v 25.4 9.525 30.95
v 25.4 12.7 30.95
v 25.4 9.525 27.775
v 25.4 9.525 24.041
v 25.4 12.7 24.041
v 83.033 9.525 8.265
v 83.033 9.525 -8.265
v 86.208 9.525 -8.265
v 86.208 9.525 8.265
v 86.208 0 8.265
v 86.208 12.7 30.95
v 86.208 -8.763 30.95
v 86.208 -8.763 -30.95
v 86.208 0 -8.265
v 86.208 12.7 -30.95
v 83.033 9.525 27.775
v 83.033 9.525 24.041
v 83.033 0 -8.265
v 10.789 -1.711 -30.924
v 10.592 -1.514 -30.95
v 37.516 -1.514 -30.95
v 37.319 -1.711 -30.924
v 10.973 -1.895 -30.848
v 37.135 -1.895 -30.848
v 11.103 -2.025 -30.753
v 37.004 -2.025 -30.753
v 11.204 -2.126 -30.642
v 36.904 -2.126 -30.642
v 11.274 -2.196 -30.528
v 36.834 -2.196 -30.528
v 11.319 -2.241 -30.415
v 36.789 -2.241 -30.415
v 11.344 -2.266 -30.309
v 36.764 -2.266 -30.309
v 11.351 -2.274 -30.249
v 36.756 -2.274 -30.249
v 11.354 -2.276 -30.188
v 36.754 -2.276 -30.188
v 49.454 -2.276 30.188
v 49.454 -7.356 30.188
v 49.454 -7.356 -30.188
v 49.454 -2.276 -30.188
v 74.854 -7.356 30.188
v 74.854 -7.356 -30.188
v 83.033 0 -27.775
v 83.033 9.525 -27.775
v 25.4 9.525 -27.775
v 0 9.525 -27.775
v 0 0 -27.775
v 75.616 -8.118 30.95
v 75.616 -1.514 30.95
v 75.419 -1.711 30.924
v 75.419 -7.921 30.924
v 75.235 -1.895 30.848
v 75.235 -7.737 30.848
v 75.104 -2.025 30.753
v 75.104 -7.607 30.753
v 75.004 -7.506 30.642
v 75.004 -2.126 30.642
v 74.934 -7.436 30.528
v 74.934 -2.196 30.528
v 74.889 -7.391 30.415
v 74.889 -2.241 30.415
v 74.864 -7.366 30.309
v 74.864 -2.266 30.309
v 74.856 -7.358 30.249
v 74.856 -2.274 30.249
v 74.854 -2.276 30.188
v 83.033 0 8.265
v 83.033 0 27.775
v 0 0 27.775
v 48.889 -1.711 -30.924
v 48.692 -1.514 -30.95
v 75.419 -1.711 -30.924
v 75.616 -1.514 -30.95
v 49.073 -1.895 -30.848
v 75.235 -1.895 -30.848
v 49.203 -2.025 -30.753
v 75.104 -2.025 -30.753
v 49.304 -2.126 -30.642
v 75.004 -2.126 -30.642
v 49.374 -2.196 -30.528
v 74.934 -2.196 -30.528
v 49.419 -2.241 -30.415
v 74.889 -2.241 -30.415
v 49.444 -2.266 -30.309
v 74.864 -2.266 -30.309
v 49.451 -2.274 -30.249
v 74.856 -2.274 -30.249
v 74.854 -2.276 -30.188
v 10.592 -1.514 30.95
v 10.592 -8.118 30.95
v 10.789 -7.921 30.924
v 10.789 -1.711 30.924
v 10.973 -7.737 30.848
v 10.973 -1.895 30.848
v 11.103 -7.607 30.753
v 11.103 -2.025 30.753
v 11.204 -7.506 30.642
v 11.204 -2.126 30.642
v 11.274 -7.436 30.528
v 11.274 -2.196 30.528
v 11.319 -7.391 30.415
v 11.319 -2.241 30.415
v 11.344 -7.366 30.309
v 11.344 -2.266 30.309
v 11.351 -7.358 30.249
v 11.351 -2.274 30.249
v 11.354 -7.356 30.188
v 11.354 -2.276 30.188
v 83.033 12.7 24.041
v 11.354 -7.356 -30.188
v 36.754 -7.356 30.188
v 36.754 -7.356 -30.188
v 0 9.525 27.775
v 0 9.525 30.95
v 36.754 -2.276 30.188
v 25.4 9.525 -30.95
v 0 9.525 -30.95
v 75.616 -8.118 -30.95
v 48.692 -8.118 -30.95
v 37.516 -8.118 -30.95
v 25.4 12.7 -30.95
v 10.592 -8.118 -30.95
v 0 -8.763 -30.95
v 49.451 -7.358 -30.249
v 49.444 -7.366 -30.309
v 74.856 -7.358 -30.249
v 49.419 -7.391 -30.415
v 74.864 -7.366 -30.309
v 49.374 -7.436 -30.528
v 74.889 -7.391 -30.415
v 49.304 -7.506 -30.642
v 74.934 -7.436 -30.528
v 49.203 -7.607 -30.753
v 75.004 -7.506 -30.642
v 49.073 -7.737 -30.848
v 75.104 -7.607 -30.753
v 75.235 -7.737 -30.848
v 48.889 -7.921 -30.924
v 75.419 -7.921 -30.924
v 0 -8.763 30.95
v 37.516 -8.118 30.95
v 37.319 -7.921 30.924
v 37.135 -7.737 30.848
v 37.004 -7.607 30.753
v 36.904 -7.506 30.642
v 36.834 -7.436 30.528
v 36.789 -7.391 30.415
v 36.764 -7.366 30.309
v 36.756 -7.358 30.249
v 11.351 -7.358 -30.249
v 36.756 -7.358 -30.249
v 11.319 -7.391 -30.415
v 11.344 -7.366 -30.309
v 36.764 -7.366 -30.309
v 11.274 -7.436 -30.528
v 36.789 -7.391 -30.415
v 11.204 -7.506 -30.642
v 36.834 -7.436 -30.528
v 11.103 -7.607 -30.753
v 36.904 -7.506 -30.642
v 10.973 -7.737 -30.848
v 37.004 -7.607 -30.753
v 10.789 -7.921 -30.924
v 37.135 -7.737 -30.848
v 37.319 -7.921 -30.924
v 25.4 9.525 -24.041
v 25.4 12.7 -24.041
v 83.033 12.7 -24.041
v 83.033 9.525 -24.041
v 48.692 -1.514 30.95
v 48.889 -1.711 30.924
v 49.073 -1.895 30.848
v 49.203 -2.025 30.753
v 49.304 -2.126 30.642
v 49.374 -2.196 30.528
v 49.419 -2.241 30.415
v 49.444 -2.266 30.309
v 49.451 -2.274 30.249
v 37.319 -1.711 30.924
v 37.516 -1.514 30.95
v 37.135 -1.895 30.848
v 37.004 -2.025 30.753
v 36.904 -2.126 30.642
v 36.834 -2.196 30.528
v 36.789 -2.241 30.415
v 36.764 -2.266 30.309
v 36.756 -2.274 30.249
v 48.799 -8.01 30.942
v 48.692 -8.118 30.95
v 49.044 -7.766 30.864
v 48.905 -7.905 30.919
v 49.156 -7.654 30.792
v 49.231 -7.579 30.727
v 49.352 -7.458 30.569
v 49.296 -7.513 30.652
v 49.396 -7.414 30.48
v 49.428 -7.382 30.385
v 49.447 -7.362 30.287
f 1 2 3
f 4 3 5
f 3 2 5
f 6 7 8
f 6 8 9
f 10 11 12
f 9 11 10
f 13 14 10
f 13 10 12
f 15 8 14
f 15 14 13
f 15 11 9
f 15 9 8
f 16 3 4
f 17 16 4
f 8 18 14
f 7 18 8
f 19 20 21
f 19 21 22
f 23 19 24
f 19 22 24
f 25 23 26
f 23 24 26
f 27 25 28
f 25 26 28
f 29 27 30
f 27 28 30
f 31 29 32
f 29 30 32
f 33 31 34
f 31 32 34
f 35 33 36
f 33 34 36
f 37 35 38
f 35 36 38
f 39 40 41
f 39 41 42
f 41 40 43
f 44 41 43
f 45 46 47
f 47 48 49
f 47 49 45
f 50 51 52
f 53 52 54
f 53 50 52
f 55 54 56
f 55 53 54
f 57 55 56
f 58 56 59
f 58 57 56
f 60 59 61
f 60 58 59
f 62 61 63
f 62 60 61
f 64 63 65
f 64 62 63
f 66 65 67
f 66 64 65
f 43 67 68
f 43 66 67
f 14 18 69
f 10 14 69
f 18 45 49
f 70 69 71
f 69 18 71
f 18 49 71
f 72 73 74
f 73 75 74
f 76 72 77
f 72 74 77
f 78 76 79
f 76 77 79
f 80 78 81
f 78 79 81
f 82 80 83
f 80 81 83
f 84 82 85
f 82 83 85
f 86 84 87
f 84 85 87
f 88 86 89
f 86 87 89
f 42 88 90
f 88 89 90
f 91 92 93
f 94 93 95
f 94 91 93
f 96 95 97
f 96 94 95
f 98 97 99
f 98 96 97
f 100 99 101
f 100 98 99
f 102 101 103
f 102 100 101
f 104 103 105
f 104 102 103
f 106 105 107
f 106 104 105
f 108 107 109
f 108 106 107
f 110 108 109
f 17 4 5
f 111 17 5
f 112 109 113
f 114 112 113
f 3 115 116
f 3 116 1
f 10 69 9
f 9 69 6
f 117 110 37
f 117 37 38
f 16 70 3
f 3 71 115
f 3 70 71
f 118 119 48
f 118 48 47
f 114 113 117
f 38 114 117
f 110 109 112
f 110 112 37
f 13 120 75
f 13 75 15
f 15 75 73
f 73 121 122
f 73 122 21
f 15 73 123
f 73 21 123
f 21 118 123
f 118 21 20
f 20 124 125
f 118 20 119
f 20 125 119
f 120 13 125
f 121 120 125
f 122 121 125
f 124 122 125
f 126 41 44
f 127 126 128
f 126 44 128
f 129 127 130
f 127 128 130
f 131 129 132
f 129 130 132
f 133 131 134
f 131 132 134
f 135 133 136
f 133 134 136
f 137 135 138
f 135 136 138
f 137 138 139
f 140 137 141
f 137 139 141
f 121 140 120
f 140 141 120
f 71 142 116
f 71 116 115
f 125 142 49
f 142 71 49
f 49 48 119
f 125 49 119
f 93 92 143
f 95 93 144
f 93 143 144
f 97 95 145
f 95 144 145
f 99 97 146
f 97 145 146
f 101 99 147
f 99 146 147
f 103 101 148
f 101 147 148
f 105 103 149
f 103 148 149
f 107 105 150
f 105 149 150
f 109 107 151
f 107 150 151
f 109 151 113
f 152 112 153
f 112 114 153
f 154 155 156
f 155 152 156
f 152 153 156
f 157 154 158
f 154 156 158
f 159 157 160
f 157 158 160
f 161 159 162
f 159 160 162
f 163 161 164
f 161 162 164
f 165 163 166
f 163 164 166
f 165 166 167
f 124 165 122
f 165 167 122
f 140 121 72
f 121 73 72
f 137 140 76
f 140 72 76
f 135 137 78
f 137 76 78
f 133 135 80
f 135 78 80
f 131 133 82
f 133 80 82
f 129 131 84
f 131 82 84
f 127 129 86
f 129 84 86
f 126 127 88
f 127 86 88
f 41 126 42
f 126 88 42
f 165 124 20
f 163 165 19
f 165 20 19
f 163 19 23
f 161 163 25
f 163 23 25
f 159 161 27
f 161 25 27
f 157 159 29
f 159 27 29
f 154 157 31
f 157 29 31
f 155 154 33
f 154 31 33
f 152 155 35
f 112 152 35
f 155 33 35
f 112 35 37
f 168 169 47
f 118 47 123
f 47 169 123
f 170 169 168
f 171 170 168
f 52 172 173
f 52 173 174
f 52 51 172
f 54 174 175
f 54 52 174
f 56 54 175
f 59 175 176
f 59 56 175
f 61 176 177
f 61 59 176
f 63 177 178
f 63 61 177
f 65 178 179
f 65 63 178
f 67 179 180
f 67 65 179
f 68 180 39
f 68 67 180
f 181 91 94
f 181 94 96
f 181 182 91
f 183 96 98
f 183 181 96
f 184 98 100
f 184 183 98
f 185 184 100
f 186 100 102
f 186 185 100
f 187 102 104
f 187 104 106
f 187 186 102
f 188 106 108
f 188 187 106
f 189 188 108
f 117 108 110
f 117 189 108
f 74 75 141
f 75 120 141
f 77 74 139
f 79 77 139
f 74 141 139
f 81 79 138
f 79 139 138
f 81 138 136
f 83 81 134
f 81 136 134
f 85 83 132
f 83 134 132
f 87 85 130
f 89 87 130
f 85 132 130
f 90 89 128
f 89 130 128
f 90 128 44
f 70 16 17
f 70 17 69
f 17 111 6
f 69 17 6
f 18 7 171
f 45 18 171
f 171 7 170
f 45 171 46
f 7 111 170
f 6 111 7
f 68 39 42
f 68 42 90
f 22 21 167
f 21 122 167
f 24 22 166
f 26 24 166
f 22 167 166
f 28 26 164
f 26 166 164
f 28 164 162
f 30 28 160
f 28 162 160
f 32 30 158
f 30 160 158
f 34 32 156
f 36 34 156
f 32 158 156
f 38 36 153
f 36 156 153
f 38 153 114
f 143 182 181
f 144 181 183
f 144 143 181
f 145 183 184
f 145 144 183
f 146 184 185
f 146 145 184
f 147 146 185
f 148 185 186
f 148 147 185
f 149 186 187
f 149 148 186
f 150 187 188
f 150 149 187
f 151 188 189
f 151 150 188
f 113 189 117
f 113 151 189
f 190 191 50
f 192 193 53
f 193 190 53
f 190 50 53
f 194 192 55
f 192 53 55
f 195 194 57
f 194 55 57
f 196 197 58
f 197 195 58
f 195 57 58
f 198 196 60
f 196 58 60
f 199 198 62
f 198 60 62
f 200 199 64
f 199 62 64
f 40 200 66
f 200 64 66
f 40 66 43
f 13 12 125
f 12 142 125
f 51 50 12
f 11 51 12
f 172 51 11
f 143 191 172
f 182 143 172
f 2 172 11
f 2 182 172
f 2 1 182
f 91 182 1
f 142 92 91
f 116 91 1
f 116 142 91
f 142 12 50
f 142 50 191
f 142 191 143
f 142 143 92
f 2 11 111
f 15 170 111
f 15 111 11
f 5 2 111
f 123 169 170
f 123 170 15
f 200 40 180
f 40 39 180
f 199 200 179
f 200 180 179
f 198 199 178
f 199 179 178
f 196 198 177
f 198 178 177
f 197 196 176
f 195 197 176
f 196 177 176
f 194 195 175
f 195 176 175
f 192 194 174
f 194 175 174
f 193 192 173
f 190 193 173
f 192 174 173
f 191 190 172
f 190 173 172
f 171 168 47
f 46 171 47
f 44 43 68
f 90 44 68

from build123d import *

# Parameters (mm, degrees)
BOSS_EXTRUDE1_DEPTH = 83.0326
SKETCH2_W           = 61.8998
SKETCH2_H           = 21.463
BOSS_EXTRUDE2_DEPTH = 3.175
SKETCH3_W           = 25.4
SKETCH3_H           = 5.08
CUT_EXTRUDE1_DEPTH  = 107.886039958
FILLET1_R           = 0.762
FILLET2_R           = 0.762
FILLET3_R           = 0.762
SKETCH5_W           = 16.529901782
SKETCH5_H           = 9.525
CUT_EXTRUDE2_DEPTH  = 90.51870739
SKETCH42_W          = 25.4
SKETCH42_H          = 6.9088
CUT_EXTRUDE3_DEPTH  = 3.175


with BuildPart() as part:
    # Sketch1 → Boss-Extrude1 (new body)
    with BuildSketch(Plane(origin=(0, 0, 0), x_dir=(0, 0, -1), z_dir=(1, 0, 0))):
        Polygon((-27.7749, 9.525), (-24.0411, 9.525), (-24.0411, 12.7), (-30.9499, 12.7), (-30.9499, -3.175), (-30.9499, -8.763), (30.9499, -8.763), (30.9499, -3.175), (30.9499, 12.7), (24.0411, 12.7), (24.0411, 9.525), (27.7749, 9.525), (27.7749, 0), (-27.7749, 0), align=None)
    extrude(amount=BOSS_EXTRUDE1_DEPTH)

    # Sketch2 → Boss-Extrude2 (add)
    with BuildSketch(Plane(origin=(83.0326, 0, 0), x_dir=(0, 0, -1), z_dir=(1, 0, 0))):
        with Locations((0, 1.9685)):
            Rectangle(SKETCH2_W, SKETCH2_H)
    extrude(amount=BOSS_EXTRUDE2_DEPTH)

    # Sketch3 → Cut-Extrude1 (cut, through all)
    with BuildSketch(Plane.XY.offset(30.9499)):
        with Locations((24.0538, -4.815937668)):
            Rectangle(SKETCH3_W, SKETCH3_H)
        with Locations((62.1538, -4.815937668)):
            Rectangle(SKETCH3_W, SKETCH3_H)
    extrude(amount=-CUT_EXTRUDE1_DEPTH, mode=Mode.SUBTRACT)

    # Fillet1
    fillet1_edges = [part.edges().sort_by_distance(p)[0] for p in [
        (24.0538, -7.355937668, -30.9499),
        (24.0538, -7.355937668, 30.9499),
        (62.1538, -7.355937668, -30.9499),
        (62.1538, -7.355937668, 30.9499),
    ]]
    fillet(fillet1_edges, radius=FILLET1_R)

    # Fillet2
    fillet2_edges = [part.edges().sort_by_distance(p)[0] for p in [
        (11.3538, -5.196937668, -30.9499),
        (24.0538, -2.275937668, -30.9499),
        (36.7538, -5.196937668, -30.9499),
        (49.4538, -5.196937668, -30.9499),
        (62.1538, -2.275937668, -30.9499),
        (74.8538, -5.196937668, -30.9499),
    ]]
    fillet(fillet2_edges, radius=FILLET2_R)

    # Fillet3
    fillet3_edges = [part.edges().sort_by_distance(p)[0] for p in [
        (74.8538, -5.196937668, 30.9499),
        (62.1538, -2.275937668, 30.9499),
        (49.4538, -5.196937668, 30.9499),
        (11.3538, -5.196937668, 30.9499),
        (24.0538, -2.275937668, 30.9499),
        (36.7538, -5.196937668, 30.9499),
    ]]
    fillet(fillet3_edges, radius=FILLET3_R)

    # Sketch5 → Cut-Extrude2 (cut, through all)
    with BuildSketch(Plane.ZY.offset(-83.0326)):
        with Locations((0, 4.7625)):
            Rectangle(SKETCH5_W, SKETCH5_H)
    extrude(amount=-CUT_EXTRUDE2_DEPTH, mode=Mode.SUBTRACT)

    # Sketch42 → Cut-Extrude3 (cut)
    with BuildSketch(Plane(origin=(0, 12.7, 0), x_dir=(1, 0, 0), z_dir=(0, 1, 0))):
        with Locations((12.7, 27.4955)):
            Rectangle(SKETCH42_W, SKETCH42_H)
        with Locations((12.7, -27.4955)):
            Rectangle(SKETCH42_W, SKETCH42_H)
    extrude(amount=-CUT_EXTRUDE3_DEPTH, mode=Mode.SUBTRACT)


solid = part.part
